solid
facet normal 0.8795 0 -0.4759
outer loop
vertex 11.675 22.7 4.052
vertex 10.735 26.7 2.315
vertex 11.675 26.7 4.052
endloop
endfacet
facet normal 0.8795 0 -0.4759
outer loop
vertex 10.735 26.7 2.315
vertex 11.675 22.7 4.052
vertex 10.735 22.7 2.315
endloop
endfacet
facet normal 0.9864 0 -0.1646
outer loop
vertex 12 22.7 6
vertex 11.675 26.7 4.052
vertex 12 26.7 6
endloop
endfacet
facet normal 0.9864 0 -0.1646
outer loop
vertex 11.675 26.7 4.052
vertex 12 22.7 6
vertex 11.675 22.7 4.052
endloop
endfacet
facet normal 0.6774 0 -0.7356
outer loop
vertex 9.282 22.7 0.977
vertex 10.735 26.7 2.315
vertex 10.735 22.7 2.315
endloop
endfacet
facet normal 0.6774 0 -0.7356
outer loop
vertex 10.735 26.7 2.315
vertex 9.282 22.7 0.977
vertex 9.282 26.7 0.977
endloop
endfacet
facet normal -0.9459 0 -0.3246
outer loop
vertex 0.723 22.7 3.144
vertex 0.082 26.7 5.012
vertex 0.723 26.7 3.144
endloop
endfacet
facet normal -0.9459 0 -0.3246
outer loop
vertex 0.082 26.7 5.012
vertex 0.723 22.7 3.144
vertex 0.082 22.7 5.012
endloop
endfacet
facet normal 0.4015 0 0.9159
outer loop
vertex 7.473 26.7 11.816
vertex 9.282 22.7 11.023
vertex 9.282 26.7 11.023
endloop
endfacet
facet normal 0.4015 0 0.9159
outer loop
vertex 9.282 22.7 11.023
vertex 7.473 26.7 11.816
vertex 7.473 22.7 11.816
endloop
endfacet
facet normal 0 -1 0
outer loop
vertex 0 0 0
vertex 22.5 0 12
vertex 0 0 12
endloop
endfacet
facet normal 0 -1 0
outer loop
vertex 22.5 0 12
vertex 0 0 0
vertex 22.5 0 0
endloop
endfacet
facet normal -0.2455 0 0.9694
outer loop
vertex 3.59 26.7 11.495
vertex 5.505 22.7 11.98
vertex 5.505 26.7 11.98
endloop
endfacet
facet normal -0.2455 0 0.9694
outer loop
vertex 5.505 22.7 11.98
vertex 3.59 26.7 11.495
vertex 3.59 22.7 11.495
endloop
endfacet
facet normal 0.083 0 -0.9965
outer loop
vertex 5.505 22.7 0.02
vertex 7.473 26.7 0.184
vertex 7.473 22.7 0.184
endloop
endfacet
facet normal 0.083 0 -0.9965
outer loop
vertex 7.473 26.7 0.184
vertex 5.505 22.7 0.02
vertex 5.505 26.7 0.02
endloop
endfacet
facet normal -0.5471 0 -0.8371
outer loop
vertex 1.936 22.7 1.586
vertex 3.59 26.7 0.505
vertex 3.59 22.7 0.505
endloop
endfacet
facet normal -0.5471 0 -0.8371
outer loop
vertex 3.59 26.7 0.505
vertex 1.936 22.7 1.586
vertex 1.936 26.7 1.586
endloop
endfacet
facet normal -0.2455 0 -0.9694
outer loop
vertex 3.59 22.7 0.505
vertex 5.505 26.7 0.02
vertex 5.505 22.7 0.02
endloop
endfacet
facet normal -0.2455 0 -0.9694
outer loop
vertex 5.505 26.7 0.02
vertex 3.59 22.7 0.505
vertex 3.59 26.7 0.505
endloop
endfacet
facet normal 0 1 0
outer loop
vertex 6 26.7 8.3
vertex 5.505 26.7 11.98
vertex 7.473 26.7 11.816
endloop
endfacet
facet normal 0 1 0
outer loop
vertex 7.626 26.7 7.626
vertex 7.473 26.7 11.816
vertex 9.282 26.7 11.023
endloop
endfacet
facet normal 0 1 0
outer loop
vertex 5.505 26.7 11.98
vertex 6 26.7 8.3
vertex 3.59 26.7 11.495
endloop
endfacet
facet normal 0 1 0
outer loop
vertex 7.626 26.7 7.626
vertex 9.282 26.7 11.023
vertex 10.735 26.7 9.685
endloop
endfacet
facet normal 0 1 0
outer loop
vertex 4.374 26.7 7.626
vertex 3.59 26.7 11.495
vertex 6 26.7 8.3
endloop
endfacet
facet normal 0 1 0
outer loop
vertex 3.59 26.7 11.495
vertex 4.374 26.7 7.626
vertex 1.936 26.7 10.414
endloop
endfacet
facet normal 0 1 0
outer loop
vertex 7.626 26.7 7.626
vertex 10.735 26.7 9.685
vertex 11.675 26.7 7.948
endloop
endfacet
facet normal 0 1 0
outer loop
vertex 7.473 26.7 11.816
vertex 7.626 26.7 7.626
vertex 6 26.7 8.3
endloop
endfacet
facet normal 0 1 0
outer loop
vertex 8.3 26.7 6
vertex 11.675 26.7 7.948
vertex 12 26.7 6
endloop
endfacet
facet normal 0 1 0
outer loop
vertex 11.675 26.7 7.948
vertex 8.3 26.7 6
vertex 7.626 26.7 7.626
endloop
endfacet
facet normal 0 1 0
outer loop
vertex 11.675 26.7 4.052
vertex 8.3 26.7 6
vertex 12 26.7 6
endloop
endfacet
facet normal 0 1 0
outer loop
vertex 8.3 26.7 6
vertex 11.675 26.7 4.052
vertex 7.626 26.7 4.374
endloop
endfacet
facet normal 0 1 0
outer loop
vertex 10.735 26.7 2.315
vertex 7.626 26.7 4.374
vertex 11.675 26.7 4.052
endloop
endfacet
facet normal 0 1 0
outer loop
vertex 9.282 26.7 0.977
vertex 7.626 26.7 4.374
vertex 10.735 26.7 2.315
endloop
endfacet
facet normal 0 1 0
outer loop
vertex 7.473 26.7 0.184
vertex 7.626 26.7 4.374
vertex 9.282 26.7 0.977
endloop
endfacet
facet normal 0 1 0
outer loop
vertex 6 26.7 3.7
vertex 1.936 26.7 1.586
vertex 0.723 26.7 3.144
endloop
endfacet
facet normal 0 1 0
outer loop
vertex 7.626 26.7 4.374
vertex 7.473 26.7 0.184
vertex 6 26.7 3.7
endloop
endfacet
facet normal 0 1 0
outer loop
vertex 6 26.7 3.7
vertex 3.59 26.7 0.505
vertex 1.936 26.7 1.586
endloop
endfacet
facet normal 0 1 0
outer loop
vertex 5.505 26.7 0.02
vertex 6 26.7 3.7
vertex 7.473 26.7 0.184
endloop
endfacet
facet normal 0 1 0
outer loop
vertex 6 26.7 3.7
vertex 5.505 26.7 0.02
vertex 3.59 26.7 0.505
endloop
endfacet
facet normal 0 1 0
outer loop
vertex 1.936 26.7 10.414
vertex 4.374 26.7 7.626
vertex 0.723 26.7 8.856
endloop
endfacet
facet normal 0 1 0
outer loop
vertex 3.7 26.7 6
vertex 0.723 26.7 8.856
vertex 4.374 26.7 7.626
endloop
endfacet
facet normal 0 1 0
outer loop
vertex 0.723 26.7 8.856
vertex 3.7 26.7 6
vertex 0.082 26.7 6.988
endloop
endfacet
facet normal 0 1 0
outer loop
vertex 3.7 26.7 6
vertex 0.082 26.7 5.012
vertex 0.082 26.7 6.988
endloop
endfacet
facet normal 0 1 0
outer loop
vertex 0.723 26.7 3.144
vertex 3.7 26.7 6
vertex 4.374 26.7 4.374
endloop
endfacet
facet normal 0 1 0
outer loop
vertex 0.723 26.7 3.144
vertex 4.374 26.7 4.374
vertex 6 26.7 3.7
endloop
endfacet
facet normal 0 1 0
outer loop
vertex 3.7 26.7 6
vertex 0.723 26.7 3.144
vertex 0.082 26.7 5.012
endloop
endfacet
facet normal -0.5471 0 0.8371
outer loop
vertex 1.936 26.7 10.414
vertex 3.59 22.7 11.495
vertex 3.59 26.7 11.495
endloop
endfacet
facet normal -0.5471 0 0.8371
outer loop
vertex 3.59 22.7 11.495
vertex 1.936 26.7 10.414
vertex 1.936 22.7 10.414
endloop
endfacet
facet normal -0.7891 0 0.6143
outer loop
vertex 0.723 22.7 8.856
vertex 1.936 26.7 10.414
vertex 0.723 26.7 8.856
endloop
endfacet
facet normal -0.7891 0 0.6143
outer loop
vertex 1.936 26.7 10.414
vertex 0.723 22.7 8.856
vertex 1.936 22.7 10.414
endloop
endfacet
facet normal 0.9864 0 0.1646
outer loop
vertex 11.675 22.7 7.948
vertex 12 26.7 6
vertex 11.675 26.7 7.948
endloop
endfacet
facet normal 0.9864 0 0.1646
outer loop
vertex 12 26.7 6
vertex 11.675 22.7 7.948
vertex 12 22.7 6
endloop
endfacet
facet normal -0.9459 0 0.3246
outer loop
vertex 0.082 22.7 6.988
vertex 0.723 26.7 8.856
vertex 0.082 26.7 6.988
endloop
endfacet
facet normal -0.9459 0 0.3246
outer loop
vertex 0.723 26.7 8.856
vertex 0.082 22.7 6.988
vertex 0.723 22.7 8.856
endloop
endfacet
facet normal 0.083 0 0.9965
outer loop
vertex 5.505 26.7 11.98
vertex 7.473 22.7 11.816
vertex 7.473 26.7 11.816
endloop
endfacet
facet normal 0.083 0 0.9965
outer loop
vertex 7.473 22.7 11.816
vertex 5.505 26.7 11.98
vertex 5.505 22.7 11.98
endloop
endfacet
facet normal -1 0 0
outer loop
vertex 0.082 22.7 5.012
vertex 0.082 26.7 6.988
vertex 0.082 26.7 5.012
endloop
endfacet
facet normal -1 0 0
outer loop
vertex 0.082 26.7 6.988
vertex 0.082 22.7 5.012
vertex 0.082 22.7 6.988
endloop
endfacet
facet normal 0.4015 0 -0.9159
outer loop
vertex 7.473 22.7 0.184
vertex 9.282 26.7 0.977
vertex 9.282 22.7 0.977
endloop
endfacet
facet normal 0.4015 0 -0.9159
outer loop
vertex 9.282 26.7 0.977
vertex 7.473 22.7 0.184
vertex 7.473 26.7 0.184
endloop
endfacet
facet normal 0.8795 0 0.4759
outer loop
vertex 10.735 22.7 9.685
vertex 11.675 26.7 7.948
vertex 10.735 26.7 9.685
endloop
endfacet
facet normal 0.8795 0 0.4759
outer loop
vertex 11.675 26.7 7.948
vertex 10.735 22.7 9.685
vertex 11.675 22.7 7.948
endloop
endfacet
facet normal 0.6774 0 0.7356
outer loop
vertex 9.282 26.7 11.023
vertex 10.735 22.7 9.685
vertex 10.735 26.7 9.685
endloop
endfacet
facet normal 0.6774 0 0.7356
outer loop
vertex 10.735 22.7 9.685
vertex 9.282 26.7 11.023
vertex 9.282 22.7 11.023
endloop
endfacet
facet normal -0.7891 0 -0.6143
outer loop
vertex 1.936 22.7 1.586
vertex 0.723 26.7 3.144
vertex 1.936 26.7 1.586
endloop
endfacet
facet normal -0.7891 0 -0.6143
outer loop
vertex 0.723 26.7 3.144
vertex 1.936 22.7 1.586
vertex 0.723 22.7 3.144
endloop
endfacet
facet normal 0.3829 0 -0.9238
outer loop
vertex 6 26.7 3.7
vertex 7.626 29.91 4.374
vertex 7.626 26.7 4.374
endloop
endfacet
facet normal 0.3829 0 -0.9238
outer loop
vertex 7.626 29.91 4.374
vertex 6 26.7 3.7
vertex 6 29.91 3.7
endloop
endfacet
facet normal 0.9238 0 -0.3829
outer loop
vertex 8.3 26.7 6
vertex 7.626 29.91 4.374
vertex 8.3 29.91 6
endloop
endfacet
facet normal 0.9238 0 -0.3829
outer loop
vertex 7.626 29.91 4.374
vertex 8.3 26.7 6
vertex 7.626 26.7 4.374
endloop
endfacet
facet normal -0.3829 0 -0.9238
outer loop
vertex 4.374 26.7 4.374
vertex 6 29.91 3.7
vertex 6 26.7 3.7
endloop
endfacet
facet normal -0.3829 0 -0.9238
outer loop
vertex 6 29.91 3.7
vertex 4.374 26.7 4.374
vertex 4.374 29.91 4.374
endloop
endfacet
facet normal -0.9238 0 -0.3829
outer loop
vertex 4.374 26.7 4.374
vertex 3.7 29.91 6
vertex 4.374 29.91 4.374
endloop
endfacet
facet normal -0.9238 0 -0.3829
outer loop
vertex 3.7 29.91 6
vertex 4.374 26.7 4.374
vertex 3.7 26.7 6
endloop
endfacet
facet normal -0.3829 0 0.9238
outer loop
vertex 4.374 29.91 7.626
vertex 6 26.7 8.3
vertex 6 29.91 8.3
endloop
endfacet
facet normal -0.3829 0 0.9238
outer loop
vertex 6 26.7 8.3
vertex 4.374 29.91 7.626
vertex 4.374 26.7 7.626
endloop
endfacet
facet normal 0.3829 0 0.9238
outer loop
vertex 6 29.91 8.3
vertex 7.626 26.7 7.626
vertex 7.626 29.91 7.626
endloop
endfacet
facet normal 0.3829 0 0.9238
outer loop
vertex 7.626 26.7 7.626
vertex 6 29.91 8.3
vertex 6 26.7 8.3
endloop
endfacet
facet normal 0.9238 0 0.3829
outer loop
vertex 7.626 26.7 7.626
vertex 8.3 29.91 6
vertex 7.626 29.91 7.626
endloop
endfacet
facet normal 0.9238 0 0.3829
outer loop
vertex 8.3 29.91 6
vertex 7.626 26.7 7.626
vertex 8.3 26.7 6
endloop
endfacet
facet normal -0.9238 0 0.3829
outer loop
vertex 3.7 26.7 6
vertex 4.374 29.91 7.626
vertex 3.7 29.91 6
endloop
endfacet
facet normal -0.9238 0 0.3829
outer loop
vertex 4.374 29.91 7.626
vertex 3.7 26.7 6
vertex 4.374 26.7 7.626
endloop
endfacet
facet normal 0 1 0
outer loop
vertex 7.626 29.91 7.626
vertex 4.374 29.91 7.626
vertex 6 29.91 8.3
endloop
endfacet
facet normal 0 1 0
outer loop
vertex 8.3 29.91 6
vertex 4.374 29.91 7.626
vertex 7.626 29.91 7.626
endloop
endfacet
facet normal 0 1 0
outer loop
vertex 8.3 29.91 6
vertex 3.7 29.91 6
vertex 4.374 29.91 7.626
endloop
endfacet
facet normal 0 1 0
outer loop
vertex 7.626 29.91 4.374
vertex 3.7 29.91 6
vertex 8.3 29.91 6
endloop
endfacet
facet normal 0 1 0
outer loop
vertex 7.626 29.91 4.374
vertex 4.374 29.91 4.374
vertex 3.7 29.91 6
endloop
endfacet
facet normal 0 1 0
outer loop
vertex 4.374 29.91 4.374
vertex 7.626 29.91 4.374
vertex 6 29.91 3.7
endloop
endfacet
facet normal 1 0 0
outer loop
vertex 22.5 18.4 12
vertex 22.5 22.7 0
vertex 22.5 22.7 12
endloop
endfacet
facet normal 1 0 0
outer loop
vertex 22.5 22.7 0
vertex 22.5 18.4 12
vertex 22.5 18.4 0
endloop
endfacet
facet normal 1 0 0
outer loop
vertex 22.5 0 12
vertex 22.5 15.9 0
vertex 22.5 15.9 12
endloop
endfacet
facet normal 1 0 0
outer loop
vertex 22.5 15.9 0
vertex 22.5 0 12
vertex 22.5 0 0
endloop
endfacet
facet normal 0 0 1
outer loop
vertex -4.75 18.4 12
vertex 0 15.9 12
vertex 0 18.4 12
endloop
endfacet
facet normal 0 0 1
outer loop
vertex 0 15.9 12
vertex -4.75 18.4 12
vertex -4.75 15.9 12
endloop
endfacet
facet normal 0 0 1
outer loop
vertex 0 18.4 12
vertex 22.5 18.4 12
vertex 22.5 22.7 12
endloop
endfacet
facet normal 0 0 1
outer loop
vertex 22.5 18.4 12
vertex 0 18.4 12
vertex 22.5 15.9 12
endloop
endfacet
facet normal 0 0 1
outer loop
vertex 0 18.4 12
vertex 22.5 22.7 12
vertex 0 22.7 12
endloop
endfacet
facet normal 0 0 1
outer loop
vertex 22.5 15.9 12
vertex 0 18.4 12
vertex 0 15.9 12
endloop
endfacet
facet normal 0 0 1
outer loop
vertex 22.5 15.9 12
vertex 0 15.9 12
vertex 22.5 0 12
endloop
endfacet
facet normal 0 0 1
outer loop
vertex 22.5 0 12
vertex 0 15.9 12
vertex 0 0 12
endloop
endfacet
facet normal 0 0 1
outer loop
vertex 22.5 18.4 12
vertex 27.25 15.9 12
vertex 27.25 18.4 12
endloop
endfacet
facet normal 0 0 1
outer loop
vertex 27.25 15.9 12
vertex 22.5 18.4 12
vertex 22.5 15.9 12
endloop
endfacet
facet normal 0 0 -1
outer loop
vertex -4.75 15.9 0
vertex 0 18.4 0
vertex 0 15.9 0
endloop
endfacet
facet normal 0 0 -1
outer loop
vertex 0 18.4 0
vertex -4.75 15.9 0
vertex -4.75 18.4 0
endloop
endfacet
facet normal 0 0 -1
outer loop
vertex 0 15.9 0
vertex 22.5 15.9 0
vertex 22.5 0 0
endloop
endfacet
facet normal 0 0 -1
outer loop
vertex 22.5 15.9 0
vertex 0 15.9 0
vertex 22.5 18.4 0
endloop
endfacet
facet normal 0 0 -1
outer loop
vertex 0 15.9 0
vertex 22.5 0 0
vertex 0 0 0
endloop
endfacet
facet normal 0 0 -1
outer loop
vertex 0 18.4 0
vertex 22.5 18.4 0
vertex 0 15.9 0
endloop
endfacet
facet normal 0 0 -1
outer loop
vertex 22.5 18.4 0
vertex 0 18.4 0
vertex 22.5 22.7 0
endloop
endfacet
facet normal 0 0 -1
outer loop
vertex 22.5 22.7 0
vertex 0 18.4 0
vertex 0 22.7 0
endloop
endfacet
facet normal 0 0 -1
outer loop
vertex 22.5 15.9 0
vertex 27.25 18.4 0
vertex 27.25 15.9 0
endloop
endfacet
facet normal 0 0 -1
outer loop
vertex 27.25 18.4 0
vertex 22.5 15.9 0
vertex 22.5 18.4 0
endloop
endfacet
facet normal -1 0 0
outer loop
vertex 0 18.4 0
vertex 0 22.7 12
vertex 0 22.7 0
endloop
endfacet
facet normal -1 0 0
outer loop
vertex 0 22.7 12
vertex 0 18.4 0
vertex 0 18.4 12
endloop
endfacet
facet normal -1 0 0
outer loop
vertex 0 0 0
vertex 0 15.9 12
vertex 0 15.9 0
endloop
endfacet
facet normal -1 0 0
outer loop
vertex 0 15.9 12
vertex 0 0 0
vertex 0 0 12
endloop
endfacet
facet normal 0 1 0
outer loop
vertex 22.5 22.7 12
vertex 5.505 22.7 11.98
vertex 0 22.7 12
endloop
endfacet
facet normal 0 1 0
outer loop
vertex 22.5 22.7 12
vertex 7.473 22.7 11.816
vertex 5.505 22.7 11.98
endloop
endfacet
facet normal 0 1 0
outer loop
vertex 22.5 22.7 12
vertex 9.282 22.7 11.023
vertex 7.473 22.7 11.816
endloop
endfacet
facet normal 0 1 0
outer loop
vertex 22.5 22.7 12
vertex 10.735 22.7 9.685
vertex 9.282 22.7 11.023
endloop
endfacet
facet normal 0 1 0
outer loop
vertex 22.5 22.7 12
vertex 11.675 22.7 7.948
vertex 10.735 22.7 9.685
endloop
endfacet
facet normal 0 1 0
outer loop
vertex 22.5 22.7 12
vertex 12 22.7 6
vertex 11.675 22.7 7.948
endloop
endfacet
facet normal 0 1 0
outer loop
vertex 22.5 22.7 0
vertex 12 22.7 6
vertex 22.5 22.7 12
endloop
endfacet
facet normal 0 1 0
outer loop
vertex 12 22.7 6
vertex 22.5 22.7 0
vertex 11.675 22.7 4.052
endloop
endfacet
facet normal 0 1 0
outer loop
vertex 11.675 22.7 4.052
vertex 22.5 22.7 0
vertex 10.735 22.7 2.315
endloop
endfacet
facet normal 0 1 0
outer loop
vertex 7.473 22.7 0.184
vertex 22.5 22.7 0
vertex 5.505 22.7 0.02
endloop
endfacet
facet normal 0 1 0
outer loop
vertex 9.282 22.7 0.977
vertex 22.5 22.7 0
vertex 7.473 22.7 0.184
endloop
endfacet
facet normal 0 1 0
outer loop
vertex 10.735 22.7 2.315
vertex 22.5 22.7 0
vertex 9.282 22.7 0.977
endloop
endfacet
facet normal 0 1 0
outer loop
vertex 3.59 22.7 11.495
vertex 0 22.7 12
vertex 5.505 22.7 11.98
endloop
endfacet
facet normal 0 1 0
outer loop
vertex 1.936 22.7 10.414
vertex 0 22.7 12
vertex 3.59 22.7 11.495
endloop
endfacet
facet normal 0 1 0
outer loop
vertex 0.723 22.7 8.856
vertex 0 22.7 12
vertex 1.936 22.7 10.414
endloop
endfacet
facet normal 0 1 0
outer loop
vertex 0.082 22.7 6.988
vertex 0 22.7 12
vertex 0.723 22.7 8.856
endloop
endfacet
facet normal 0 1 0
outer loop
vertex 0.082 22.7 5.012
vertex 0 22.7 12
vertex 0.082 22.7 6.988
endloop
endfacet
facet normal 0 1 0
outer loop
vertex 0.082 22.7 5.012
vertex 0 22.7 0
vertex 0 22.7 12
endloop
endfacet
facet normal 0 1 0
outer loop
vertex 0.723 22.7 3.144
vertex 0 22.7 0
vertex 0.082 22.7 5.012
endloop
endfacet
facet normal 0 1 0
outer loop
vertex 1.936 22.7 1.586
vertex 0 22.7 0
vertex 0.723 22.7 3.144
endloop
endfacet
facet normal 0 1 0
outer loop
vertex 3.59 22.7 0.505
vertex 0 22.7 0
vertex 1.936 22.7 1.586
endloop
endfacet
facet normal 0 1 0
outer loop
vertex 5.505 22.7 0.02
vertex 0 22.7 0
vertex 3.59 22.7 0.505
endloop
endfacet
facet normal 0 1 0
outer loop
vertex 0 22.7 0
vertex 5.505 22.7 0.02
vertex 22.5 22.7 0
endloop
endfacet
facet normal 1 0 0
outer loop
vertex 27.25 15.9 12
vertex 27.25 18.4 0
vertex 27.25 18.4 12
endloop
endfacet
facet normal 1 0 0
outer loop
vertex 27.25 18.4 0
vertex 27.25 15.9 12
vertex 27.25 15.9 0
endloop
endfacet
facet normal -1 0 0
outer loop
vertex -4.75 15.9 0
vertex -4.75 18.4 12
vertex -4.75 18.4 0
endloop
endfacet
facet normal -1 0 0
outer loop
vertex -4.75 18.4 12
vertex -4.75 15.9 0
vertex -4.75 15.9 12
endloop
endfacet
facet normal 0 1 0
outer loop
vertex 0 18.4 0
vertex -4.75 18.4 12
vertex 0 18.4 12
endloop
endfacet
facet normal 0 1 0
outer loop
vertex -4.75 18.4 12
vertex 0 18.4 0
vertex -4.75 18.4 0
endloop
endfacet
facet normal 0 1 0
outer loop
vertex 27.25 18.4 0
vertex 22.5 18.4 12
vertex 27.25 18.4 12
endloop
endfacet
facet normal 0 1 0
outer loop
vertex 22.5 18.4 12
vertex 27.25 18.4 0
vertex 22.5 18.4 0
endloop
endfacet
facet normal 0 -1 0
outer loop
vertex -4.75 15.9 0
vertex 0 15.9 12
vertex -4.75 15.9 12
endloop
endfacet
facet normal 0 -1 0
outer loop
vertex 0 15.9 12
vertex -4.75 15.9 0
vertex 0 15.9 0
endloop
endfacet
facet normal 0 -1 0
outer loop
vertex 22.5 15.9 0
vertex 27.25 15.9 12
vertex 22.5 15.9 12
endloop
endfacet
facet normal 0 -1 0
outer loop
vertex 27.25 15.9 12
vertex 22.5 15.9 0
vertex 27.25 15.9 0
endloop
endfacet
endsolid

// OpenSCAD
// file: ../common.scad
//
// QP_OpenSCAD_lib
//
// GNU GPL v3
// quackingplums@gmail.com
//
// Useful tools and utilities
//

/*
module position(translate = [], rotate = [], colour = -1)
Rotate, translate and colour an arbitrary list of objects. In that order
translate		coordinate vector
rotate    		axis angles
colour   		any valid w3/css3 colour name

module show_build_area(x = 200, y = 200, corner_radius = 20)
Draw (non-printing) build platform template
Useful for plating up objects.
Default to Mendel90 with IKEA SÖRLI mirror tile.
x				x dimension
y				y dimension
corner_radius	20mm for SÖRLI
*/


module position(translate = [], rotate = [], colour = -1)
	for (i = [0 : $children-1])
		translate(translate)
			rotate(rotate)
				if (colour == -1)
					child(i);
				else
					color(colour)
						child(i);

module show_build_area(x = 200, y = 200, corner_radius = 20)
{
	%	// transparency modifier - doesn't print
	hull()
	{
		translate([x/2 - corner_radius, y/2 - corner_radius, -1])
			cylinder(h = 1, r = corner_radius);
		translate([-x/2 + corner_radius, y/2 - corner_radius, -1])
			cylinder(h = 1, r = corner_radius);
		translate([-x/2 + corner_radius, -y/2 + corner_radius, -1])
			cylinder(h = 1, r = corner_radius);
		translate([x/2 - corner_radius, -y/2 + corner_radius, -1])
			cylinder(h = 1, r = corner_radius);
	}
}
// file: servos_h.scad
//
// QP_OpenSCAD_lib
//
// GNU GPL v3
// quackingplums@gmail.com
//
// Servos - header definitions
//

// Servo types

generic_9g = ["Generic 9g micro servo",					// name
	[23, 22, 12.5], "Steelblue",						// body
	[32, 2, 12.5], "Steelblue",							// mount tabs, colour
	4,												// shoulder height
	12, 25.75, 0,	"Steelblue",							// output shaft d, h (total), offset, colour
	4.7, 29.25, "White"								// spline d, h (total), colour
];
towerpro_MG90s = ["TowerPro MG90S 9g micro servo",
	[22.5, 22.7, 12], "Black",
	[32, 2.5, 12], "Black",
	4.3,
	12, 26.7, 0, "Black",
	4.6, 29.9, "Silver"
];
	

function servoName(servo) = servo[0];
function servoBody(servo) = servo[1];
function servoBodyColour(servo) = servo[2];
function servoMount(servo) = servo[3];
function servoMountColour(servo) = servo[4];
function servoShoulder(servo) = servo[5];
function servoOutputShaftDiameter(servo) = servo[6];
function servoOutputShaftHeight(servo) = servo[7];
function servoOutputShaftOffset(servo) = servo[8];
function servoOutputShaftColour(servo) = servo[9];
function servoSplineDiameter(servo) = servo[10];
function servoSplineHeight(servo) = servo[11];
function servoSplineColour(servo) = servo[12];

function servoBodyWidth(servo) = servoBody(servo)[0];		// x, in this orientation
function servoBodyHeight(servo) = servoBody(servo)[1];		// y, in this orientation
function servoBodyThick(servo) = servoBody(servo)[2];		// z, in this orientation
function servoMountLength(servo) = servoMount(servo)[0];	// x
function servoMountThick(servo) = servoMount(servo)[1];	// y
function servoMountWidth(servo) = servoMount(servo)[2];	// z
// main file
//
// QP_OpenSCAD_lib
//
// GNU GPL v3
// quackingplums@gmail.com
//
// Servos
//

include <servos_h.scad>;
use <../docSCAD.scad>;							//docSCAD_help();
use <../common.scad>;


Servo(towerpro_MG90s);
module Servo(type=generic_9g, colour=true)
{
	body = servoBody(type);
	bodyColour = colour?servoBodyColour(type):0;
	bodyWidth = servoBodyWidth(type);
	bodyHeight = servoBodyHeight(type);
	bodyThick = servoBodyThick(type);
	mount = servoMount(type);
	mountColour = colour?servoMountColour(type):0;
	mountLength = servoMountLength(type);
	mountThick = servoMountThick(type);
	mountWidth = servoMountWidth(type);
	shoulder = servoShoulder(type);
	outputShaftColour = colour?servoOutputShaftColour(type):0;
	outputShaftDiameter = servoOutputShaftDiameter(type);
	outputShaftHeight = servoOutputShaftHeight(type);
	outputShaftOffset = servoOutputShaftOffset(type);
	splineColour = colour?servoSplineColour(type):0;
	splineDiameter = servoSplineDiameter(type);
	splineHeight = servoSplineHeight(type);

	// body
	color(bodyColour)
		cube(body);
	// mount
	translate([
		(bodyWidth-mountLength)/2, 	bodyHeight-mountThick-shoulder, (bodyThick-mountWidth)/2])
		color(mountColour)
			cube(mount);
	position(
		rotate=[-90, 0, 0],
		translate=[outputShaftDiameter/2 + outputShaftOffset, 0, outputShaftDiameter/2])
	{
		// output shaft collar
		color(outputShaftColour)
			cylinder(d=outputShaftDiameter, h=outputShaftHeight);
		// spline
		translate([0, 0, 0.01])
		color(splineColour)
			cylinder(d=splineDiameter, h=splineHeight);
	}
}

servos_help();
module servos_help()
{
	formatHelp_simple(
		libraryName = "servos.scad",
		description = str("Servo placeholders for the following servos:<p>",
			"<b>generic_9g</b> - Generic 9g micro servo<br>",
			"<b>towerpro_MG90s</b> - TowerPro MG90S 9g micro servo"
		),
		members = [
			new_member(
				name="Servo",
				description=[
					"Render a servo",
					"",
					"type = Servo type (see above)",
					"colour = true|false"
					],
				parameters="type, colour"
			)
		]
	);
}
